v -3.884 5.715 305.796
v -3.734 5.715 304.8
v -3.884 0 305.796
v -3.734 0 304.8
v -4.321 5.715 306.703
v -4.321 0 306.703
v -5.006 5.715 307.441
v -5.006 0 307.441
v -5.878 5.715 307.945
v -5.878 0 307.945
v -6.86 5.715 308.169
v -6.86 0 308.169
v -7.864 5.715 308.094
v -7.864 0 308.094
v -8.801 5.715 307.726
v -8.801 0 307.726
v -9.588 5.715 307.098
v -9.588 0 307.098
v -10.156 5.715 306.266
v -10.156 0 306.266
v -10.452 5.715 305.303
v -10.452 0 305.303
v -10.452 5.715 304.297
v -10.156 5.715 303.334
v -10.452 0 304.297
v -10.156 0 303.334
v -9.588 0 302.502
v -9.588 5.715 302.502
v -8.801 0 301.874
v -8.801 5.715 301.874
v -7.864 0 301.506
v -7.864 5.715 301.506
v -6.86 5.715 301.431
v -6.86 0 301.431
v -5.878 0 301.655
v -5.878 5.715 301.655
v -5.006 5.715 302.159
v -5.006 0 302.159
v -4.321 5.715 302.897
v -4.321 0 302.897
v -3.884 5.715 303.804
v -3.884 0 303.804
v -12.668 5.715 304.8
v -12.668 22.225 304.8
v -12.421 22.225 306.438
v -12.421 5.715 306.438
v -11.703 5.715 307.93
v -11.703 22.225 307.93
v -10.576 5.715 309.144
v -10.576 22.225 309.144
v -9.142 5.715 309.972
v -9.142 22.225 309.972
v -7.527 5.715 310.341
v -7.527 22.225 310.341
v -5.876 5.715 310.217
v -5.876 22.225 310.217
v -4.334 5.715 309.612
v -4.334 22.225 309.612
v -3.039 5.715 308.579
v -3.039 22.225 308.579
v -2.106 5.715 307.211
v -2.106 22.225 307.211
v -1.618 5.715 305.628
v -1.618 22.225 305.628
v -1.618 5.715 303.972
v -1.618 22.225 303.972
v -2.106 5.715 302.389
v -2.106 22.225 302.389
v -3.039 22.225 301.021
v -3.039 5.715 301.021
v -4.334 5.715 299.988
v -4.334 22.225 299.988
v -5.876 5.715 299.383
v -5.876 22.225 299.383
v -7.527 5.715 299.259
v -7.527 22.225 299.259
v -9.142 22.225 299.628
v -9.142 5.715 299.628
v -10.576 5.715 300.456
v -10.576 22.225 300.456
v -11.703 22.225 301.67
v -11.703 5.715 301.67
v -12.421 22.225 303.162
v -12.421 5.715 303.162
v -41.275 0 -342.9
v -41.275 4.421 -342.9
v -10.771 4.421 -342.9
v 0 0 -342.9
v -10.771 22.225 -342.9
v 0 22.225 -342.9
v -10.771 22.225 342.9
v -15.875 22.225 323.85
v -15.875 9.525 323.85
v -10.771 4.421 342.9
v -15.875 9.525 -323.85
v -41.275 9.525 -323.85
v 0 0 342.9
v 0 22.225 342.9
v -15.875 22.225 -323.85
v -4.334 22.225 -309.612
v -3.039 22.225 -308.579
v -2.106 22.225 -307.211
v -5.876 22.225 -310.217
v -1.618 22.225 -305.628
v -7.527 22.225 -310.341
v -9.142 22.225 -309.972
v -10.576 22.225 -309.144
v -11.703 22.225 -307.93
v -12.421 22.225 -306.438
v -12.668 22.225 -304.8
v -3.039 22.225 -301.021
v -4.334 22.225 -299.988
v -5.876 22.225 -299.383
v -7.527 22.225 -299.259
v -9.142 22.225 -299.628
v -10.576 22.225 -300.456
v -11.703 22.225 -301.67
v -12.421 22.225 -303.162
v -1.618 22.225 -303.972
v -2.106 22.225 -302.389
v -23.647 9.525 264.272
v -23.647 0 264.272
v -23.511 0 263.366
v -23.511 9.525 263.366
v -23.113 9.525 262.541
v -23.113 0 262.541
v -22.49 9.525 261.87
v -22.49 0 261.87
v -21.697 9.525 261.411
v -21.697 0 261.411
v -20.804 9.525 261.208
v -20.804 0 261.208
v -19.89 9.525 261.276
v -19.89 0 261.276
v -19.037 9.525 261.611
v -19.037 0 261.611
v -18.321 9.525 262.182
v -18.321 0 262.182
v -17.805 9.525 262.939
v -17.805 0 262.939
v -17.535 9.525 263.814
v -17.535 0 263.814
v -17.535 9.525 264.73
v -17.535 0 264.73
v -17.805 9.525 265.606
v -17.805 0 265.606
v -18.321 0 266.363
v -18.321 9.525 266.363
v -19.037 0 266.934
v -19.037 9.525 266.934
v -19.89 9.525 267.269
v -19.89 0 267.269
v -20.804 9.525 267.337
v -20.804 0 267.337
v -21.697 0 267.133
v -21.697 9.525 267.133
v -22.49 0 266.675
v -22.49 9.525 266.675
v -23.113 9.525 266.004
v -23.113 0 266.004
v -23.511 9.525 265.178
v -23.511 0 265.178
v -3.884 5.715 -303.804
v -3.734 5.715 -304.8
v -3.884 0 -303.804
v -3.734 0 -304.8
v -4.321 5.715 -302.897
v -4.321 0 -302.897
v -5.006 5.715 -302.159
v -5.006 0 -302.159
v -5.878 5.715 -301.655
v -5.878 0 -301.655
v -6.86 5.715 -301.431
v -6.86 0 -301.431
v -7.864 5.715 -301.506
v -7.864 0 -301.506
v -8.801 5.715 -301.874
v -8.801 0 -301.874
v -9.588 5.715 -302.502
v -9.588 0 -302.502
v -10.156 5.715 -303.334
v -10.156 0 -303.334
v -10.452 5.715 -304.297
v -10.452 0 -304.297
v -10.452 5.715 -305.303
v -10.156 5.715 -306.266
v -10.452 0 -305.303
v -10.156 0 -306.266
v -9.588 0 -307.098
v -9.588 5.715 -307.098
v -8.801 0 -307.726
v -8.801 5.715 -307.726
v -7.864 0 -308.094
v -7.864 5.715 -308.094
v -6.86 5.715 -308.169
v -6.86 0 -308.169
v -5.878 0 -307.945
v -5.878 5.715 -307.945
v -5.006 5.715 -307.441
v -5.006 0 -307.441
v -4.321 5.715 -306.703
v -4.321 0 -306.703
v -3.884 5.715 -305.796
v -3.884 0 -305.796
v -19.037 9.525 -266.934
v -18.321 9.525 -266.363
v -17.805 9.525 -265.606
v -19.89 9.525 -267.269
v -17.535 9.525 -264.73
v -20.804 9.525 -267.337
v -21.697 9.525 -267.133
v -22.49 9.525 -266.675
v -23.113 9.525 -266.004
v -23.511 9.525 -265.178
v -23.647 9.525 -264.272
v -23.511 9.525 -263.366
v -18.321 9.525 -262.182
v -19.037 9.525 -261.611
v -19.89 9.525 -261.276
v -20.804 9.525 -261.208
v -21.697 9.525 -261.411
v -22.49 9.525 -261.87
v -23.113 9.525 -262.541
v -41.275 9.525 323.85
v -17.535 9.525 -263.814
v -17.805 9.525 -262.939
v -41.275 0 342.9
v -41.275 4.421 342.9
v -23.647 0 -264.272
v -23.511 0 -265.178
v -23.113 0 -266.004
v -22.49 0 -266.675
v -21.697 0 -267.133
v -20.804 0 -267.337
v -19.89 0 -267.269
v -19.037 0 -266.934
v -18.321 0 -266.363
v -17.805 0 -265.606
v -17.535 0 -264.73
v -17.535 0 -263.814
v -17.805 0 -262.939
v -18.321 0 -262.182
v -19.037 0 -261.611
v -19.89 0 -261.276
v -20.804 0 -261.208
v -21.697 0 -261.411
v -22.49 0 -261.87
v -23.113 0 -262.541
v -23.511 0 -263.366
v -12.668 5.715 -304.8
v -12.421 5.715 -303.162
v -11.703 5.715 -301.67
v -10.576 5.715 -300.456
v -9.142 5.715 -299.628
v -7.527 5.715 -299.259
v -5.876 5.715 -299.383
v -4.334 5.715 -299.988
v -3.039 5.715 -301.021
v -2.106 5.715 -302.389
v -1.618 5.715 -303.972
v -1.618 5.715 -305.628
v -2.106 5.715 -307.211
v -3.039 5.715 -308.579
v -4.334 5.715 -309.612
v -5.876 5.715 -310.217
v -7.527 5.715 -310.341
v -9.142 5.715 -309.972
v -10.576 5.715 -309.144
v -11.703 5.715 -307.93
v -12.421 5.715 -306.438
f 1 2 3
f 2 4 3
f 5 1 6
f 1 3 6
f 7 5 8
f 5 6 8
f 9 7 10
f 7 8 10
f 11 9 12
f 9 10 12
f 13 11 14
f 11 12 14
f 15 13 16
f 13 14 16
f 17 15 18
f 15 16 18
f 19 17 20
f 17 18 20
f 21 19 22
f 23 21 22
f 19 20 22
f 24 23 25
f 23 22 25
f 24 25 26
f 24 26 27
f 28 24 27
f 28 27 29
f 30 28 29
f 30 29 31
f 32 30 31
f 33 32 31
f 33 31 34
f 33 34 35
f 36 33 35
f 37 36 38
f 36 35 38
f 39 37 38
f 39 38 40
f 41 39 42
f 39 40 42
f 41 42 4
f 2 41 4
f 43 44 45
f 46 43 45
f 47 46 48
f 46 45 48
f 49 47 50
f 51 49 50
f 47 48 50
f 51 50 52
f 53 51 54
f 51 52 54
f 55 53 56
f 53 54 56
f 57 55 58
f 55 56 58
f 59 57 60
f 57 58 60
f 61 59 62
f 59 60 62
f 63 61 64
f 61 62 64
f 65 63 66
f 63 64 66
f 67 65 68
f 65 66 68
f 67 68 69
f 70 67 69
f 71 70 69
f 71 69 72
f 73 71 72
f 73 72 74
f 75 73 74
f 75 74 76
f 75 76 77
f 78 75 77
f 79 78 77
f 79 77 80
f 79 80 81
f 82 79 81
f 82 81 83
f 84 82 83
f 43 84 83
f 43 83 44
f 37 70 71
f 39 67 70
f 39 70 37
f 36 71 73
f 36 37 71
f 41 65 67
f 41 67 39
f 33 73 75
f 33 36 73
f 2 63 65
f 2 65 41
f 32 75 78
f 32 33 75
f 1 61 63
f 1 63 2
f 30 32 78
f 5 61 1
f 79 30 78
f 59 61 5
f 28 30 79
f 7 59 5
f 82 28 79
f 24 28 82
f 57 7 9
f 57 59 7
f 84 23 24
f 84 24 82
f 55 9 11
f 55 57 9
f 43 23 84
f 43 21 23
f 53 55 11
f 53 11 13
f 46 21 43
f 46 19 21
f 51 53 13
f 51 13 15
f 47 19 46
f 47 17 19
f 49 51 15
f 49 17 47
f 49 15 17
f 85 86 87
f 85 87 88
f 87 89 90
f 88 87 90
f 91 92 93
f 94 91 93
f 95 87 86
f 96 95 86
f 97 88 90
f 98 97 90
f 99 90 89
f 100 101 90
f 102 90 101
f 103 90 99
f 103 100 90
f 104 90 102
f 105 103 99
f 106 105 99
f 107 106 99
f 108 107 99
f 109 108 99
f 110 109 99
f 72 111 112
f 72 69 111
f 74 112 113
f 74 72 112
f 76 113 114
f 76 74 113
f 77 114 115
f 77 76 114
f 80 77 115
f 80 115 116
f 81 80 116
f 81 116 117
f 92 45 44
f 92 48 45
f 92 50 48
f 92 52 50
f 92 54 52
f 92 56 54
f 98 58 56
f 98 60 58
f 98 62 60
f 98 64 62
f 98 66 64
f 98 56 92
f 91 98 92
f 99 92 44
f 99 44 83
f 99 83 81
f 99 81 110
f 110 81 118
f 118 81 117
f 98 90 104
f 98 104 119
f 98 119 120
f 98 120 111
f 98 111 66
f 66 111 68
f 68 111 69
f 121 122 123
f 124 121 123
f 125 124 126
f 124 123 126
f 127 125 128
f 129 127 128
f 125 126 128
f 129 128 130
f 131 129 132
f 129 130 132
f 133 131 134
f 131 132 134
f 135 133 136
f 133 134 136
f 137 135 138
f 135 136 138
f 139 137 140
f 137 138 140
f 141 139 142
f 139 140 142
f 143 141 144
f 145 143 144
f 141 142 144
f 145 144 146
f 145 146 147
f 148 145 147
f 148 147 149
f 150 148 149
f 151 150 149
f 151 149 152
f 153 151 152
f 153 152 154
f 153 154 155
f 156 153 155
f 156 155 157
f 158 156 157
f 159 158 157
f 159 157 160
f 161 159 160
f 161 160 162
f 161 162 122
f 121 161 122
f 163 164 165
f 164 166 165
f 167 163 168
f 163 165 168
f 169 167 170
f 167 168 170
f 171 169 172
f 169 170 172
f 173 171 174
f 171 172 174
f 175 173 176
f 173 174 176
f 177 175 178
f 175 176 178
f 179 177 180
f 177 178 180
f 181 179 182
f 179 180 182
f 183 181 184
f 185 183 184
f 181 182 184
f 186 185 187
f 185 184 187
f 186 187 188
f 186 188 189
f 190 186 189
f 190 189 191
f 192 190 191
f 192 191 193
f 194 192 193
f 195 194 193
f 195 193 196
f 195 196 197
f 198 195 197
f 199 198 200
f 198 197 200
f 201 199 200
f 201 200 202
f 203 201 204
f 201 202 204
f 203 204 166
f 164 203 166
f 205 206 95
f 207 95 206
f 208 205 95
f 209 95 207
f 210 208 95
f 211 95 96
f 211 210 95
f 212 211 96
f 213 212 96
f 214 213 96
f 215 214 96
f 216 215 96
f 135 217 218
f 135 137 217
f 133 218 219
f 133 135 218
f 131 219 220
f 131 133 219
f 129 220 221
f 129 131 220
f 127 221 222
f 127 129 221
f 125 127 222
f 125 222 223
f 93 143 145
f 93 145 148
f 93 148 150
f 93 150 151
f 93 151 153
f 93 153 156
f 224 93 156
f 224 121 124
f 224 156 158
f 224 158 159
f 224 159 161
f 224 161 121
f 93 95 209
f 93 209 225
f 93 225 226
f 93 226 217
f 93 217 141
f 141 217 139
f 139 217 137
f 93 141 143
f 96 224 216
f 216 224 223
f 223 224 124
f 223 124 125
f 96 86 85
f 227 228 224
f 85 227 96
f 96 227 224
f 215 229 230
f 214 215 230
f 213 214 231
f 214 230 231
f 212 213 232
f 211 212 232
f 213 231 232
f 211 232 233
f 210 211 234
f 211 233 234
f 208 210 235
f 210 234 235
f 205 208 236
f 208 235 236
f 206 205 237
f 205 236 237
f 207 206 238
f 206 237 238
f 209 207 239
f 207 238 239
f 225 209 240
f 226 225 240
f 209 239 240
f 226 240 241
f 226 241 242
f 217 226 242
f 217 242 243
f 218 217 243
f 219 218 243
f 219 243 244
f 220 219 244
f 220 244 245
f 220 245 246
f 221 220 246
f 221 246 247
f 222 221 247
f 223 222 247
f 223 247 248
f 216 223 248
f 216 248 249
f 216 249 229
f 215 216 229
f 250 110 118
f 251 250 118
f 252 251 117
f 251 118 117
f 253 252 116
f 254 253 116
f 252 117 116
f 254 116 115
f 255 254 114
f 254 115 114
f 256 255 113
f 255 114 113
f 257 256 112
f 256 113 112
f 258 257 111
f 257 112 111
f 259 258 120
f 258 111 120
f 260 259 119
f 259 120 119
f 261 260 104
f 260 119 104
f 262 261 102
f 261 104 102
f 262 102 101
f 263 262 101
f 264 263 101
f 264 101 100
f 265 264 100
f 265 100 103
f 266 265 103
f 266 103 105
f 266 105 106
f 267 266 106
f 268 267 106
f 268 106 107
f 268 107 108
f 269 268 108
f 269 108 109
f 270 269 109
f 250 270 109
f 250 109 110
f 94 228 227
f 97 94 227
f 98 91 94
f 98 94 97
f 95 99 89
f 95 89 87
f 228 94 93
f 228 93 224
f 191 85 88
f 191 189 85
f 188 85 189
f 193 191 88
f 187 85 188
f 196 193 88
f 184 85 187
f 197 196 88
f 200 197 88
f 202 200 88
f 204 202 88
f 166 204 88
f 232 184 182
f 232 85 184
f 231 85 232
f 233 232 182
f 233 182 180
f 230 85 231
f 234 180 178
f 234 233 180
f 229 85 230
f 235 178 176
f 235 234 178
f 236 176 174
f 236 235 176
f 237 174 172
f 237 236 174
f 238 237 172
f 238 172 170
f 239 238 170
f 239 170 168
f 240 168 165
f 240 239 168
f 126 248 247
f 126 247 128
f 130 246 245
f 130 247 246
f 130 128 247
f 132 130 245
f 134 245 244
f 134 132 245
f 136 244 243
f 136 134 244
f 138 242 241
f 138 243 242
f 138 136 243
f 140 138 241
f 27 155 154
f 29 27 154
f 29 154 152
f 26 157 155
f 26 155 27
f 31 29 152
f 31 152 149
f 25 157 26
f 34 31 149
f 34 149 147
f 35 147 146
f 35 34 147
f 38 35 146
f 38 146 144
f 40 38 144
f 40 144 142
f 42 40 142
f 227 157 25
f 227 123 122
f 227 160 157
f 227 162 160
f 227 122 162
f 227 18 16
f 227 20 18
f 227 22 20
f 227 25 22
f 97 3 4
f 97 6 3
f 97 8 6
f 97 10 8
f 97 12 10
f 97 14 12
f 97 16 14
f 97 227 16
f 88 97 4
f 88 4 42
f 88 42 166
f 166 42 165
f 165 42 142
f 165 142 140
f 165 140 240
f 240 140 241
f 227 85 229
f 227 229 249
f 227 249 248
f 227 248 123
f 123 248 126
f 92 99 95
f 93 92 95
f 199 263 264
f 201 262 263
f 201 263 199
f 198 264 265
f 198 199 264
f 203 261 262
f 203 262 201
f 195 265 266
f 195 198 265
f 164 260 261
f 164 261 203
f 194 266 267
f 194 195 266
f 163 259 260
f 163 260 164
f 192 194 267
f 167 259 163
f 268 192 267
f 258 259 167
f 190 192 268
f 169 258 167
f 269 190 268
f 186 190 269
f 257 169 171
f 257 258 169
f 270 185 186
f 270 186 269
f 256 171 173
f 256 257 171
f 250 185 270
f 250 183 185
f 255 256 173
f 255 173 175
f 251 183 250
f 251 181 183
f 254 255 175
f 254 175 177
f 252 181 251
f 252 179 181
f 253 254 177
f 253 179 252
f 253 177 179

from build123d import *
from OCP.BRepFilletAPI import BRepFilletAPI_MakeChamfer

# Parameters (mm, degrees)
EXTRUDE1_DEPTH                                   = 342.9
CHAMFER1_SIZE                                    = 19.05
CHAMFER1_SIZE2                                   = 5.104432116
CHAMFER3_SIZE                                    = 19.05
CHAMFER3_SIZE2                                   = 5.104432116
CBORE_FOR_1_4_SOCKET_HEAD_CAP_SCREW1_D           = 6.7564
CBORE_FOR_1_4_SOCKET_HEAD_CAP_SCREW1_CBORE_D     = 11.1125
CBORE_FOR_1_4_SOCKET_HEAD_CAP_SCREW1_CBORE_DEPTH = 16.51
C_0_242_DIAMETER_HOLE1_D                         = 6.1468


with BuildPart() as part:
    # Sketch1 → Extrude1 (new, symmetric)
    with BuildSketch(Plane.XY):
        Polygon((0, 0), (0, 22.225), (-15.875, 22.225), (-15.875, 9.525), (-41.275, 9.525), (-41.275, 0), (-28.448, 0), align=None)
    extrude(amount=EXTRUDE1_DEPTH, both=True)

    # Chamfer1: one chamfer whose edges measure the first distance from different faces: ONE call of the kernel's chamfer builder (chamfer() names one face for all edges)
    chamfer1_edges_1 = [part.edges().sort_by_distance(p)[0] for p in [
        (-28.575, 9.525, 342.9),
    ]]
    chamfer1_side_1 = [part.faces().sort_by_distance(p)[0] for p in [
        (-28.575, 9.525, 0),
    ]]
    chamfer1_edges_2 = [part.edges().sort_by_distance(p)[0] for p in [
        (-15.875, 15.875, 342.9),
    ]]
    chamfer1_side_2 = [part.faces().sort_by_distance(p)[0] for p in [
        (-15.875, 15.875, 0),
    ]]
    chamfer1 = BRepFilletAPI_MakeChamfer(part.part.solid().wrapped)
    for e in chamfer1_edges_1:
        chamfer1.Add(CHAMFER1_SIZE, CHAMFER1_SIZE2, e.wrapped, chamfer1_side_1[0].wrapped)  # the first distance lies on this face
    for e in chamfer1_edges_2:
        chamfer1.Add(CHAMFER1_SIZE, CHAMFER1_SIZE2, e.wrapped, chamfer1_side_2[0].wrapped)  # the first distance lies on this face
    add(Compound.cast(chamfer1.Shape()), mode=Mode.REPLACE)

    # Chamfer3: one chamfer whose edges measure the first distance from different faces: ONE call of the kernel's chamfer builder (chamfer() names one face for all edges)
    chamfer3_edges_1 = [part.edges().sort_by_distance(p)[0] for p in [
        (-15.875, 15.875, -342.9),
    ]]
    chamfer3_side_1 = [part.faces().sort_by_distance(p)[0] for p in [
        (-15.875, 15.875, -9.525),
    ]]
    chamfer3_edges_2 = [part.edges().sort_by_distance(p)[0] for p in [
        (-28.575, 9.525, -342.9),
    ]]
    chamfer3_side_2 = [part.faces().sort_by_distance(p)[0] for p in [
        (-28.575, 9.525, -9.525),
    ]]
    chamfer3 = BRepFilletAPI_MakeChamfer(part.part.solid().wrapped)
    for e in chamfer3_edges_1:
        chamfer3.Add(CHAMFER3_SIZE, CHAMFER3_SIZE2, e.wrapped, chamfer3_side_1[0].wrapped)  # the first distance lies on this face
    for e in chamfer3_edges_2:
        chamfer3.Add(CHAMFER3_SIZE, CHAMFER3_SIZE2, e.wrapped, chamfer3_side_2[0].wrapped)  # the first distance lies on this face
    add(Compound.cast(chamfer3.Shape()), mode=Mode.REPLACE)

    # CBORE for 1/4 Socket Head Cap Screw1 (through all)
    with Locations(Plane(origin=(0, 22.225, 0), x_dir=(-1, 0, 0), z_dir=(0, 1, 0))):
        with Locations((7.112, 304.8), (7.112, -304.8)):
            CounterBoreHole(CBORE_FOR_1_4_SOCKET_HEAD_CAP_SCREW1_D / 2, CBORE_FOR_1_4_SOCKET_HEAD_CAP_SCREW1_CBORE_D / 2, CBORE_FOR_1_4_SOCKET_HEAD_CAP_SCREW1_CBORE_DEPTH)

    # C (0.242) Diameter Hole1 (through all)
    with Locations(Plane(origin=(2.077199123, 9.525, 2.74697932), x_dir=(1, 0, 0), z_dir=(0, 1, 0))):
        with Locations((-22.651199123, -261.52541668), (-22.651199123, 267.01937532)):
            Hole(C_0_242_DIAMETER_HOLE1_D / 2)


solid = part.part
